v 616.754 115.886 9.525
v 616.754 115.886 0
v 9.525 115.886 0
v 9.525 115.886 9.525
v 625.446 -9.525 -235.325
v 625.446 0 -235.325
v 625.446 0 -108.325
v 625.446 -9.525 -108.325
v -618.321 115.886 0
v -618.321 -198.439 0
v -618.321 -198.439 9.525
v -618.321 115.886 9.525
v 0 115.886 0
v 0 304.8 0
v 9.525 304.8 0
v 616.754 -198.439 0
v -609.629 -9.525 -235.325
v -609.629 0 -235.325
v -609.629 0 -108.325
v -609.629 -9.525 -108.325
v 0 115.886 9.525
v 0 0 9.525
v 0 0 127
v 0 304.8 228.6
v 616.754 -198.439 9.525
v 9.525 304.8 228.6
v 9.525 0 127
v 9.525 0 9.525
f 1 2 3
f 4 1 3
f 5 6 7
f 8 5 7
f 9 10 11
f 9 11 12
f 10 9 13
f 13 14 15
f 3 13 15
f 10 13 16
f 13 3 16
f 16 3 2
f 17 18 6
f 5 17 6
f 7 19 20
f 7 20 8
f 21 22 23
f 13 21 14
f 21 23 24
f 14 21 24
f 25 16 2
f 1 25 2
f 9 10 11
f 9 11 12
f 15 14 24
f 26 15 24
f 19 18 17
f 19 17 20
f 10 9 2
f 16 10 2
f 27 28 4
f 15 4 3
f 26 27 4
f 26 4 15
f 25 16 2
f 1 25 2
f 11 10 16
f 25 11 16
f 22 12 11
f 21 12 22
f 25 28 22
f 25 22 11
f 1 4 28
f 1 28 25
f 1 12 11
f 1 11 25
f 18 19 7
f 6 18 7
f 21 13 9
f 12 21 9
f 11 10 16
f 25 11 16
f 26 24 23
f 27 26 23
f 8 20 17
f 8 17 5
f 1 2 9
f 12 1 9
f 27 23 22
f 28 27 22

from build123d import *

# Parameters (mm, degrees)
F1_DEPTH = 9.525
F2_W     = 1235.075
F2_H     = 127
F3_DEPTH = 9.525
F4_W     = 309.5625
F4_H     = 314.325
F4_W_2   = 306.3875
F5_DEPTH = 9.525
F6_DEPTH = 9.525


with BuildPart() as f1:
    # F0 (on Right) → F1 (new body)
    with BuildSketch(Plane.YZ):
        Polygon((0, 127), (0, 0), (304.8, 0), (304.8, 228.6), align=None)
    extrude(amount=F1_DEPTH)

    # F4 (on Top) → F5 (join)
    with BuildSketch(Plane.XY):
        with Locations((-463.539516, -41.276115)):
            Rectangle(F4_W, F4_H)
        with Locations((-153.977016, -41.276115)):
            Rectangle(F4_W, F4_H)
        with Locations((155.585484, -41.276115)):
            Rectangle(F4_W, F4_H)
        with Locations((463.560484, -41.276115)):
            Rectangle(F4_W_2, F4_H)
    extrude(amount=F5_DEPTH)


with BuildPart() as f3:
    # F2 (on Front) → F3 (new body)
    with BuildSketch(Plane.XZ):
        with Locations((7.908151, -171.824664)):
            Rectangle(F2_W, F2_H)
    extrude(amount=F3_DEPTH)


with BuildPart() as f6:
    # F4 (on Top) → F6 (new body)
    with BuildSketch(Plane.XY):
        with Locations((-463.539516, -41.276115)):
            Rectangle(F4_W, F4_H)
        with Locations((-153.977016, -41.276115)):
            Rectangle(F4_W, F4_H)
        with Locations((155.585484, -41.276115)):
            Rectangle(F4_W, F4_H)
        with Locations((463.560484, -41.276115)):
            Rectangle(F4_W_2, F4_H)
    extrude(amount=F6_DEPTH)


solid = Compound([f1.part, f3.part, f6.part])
